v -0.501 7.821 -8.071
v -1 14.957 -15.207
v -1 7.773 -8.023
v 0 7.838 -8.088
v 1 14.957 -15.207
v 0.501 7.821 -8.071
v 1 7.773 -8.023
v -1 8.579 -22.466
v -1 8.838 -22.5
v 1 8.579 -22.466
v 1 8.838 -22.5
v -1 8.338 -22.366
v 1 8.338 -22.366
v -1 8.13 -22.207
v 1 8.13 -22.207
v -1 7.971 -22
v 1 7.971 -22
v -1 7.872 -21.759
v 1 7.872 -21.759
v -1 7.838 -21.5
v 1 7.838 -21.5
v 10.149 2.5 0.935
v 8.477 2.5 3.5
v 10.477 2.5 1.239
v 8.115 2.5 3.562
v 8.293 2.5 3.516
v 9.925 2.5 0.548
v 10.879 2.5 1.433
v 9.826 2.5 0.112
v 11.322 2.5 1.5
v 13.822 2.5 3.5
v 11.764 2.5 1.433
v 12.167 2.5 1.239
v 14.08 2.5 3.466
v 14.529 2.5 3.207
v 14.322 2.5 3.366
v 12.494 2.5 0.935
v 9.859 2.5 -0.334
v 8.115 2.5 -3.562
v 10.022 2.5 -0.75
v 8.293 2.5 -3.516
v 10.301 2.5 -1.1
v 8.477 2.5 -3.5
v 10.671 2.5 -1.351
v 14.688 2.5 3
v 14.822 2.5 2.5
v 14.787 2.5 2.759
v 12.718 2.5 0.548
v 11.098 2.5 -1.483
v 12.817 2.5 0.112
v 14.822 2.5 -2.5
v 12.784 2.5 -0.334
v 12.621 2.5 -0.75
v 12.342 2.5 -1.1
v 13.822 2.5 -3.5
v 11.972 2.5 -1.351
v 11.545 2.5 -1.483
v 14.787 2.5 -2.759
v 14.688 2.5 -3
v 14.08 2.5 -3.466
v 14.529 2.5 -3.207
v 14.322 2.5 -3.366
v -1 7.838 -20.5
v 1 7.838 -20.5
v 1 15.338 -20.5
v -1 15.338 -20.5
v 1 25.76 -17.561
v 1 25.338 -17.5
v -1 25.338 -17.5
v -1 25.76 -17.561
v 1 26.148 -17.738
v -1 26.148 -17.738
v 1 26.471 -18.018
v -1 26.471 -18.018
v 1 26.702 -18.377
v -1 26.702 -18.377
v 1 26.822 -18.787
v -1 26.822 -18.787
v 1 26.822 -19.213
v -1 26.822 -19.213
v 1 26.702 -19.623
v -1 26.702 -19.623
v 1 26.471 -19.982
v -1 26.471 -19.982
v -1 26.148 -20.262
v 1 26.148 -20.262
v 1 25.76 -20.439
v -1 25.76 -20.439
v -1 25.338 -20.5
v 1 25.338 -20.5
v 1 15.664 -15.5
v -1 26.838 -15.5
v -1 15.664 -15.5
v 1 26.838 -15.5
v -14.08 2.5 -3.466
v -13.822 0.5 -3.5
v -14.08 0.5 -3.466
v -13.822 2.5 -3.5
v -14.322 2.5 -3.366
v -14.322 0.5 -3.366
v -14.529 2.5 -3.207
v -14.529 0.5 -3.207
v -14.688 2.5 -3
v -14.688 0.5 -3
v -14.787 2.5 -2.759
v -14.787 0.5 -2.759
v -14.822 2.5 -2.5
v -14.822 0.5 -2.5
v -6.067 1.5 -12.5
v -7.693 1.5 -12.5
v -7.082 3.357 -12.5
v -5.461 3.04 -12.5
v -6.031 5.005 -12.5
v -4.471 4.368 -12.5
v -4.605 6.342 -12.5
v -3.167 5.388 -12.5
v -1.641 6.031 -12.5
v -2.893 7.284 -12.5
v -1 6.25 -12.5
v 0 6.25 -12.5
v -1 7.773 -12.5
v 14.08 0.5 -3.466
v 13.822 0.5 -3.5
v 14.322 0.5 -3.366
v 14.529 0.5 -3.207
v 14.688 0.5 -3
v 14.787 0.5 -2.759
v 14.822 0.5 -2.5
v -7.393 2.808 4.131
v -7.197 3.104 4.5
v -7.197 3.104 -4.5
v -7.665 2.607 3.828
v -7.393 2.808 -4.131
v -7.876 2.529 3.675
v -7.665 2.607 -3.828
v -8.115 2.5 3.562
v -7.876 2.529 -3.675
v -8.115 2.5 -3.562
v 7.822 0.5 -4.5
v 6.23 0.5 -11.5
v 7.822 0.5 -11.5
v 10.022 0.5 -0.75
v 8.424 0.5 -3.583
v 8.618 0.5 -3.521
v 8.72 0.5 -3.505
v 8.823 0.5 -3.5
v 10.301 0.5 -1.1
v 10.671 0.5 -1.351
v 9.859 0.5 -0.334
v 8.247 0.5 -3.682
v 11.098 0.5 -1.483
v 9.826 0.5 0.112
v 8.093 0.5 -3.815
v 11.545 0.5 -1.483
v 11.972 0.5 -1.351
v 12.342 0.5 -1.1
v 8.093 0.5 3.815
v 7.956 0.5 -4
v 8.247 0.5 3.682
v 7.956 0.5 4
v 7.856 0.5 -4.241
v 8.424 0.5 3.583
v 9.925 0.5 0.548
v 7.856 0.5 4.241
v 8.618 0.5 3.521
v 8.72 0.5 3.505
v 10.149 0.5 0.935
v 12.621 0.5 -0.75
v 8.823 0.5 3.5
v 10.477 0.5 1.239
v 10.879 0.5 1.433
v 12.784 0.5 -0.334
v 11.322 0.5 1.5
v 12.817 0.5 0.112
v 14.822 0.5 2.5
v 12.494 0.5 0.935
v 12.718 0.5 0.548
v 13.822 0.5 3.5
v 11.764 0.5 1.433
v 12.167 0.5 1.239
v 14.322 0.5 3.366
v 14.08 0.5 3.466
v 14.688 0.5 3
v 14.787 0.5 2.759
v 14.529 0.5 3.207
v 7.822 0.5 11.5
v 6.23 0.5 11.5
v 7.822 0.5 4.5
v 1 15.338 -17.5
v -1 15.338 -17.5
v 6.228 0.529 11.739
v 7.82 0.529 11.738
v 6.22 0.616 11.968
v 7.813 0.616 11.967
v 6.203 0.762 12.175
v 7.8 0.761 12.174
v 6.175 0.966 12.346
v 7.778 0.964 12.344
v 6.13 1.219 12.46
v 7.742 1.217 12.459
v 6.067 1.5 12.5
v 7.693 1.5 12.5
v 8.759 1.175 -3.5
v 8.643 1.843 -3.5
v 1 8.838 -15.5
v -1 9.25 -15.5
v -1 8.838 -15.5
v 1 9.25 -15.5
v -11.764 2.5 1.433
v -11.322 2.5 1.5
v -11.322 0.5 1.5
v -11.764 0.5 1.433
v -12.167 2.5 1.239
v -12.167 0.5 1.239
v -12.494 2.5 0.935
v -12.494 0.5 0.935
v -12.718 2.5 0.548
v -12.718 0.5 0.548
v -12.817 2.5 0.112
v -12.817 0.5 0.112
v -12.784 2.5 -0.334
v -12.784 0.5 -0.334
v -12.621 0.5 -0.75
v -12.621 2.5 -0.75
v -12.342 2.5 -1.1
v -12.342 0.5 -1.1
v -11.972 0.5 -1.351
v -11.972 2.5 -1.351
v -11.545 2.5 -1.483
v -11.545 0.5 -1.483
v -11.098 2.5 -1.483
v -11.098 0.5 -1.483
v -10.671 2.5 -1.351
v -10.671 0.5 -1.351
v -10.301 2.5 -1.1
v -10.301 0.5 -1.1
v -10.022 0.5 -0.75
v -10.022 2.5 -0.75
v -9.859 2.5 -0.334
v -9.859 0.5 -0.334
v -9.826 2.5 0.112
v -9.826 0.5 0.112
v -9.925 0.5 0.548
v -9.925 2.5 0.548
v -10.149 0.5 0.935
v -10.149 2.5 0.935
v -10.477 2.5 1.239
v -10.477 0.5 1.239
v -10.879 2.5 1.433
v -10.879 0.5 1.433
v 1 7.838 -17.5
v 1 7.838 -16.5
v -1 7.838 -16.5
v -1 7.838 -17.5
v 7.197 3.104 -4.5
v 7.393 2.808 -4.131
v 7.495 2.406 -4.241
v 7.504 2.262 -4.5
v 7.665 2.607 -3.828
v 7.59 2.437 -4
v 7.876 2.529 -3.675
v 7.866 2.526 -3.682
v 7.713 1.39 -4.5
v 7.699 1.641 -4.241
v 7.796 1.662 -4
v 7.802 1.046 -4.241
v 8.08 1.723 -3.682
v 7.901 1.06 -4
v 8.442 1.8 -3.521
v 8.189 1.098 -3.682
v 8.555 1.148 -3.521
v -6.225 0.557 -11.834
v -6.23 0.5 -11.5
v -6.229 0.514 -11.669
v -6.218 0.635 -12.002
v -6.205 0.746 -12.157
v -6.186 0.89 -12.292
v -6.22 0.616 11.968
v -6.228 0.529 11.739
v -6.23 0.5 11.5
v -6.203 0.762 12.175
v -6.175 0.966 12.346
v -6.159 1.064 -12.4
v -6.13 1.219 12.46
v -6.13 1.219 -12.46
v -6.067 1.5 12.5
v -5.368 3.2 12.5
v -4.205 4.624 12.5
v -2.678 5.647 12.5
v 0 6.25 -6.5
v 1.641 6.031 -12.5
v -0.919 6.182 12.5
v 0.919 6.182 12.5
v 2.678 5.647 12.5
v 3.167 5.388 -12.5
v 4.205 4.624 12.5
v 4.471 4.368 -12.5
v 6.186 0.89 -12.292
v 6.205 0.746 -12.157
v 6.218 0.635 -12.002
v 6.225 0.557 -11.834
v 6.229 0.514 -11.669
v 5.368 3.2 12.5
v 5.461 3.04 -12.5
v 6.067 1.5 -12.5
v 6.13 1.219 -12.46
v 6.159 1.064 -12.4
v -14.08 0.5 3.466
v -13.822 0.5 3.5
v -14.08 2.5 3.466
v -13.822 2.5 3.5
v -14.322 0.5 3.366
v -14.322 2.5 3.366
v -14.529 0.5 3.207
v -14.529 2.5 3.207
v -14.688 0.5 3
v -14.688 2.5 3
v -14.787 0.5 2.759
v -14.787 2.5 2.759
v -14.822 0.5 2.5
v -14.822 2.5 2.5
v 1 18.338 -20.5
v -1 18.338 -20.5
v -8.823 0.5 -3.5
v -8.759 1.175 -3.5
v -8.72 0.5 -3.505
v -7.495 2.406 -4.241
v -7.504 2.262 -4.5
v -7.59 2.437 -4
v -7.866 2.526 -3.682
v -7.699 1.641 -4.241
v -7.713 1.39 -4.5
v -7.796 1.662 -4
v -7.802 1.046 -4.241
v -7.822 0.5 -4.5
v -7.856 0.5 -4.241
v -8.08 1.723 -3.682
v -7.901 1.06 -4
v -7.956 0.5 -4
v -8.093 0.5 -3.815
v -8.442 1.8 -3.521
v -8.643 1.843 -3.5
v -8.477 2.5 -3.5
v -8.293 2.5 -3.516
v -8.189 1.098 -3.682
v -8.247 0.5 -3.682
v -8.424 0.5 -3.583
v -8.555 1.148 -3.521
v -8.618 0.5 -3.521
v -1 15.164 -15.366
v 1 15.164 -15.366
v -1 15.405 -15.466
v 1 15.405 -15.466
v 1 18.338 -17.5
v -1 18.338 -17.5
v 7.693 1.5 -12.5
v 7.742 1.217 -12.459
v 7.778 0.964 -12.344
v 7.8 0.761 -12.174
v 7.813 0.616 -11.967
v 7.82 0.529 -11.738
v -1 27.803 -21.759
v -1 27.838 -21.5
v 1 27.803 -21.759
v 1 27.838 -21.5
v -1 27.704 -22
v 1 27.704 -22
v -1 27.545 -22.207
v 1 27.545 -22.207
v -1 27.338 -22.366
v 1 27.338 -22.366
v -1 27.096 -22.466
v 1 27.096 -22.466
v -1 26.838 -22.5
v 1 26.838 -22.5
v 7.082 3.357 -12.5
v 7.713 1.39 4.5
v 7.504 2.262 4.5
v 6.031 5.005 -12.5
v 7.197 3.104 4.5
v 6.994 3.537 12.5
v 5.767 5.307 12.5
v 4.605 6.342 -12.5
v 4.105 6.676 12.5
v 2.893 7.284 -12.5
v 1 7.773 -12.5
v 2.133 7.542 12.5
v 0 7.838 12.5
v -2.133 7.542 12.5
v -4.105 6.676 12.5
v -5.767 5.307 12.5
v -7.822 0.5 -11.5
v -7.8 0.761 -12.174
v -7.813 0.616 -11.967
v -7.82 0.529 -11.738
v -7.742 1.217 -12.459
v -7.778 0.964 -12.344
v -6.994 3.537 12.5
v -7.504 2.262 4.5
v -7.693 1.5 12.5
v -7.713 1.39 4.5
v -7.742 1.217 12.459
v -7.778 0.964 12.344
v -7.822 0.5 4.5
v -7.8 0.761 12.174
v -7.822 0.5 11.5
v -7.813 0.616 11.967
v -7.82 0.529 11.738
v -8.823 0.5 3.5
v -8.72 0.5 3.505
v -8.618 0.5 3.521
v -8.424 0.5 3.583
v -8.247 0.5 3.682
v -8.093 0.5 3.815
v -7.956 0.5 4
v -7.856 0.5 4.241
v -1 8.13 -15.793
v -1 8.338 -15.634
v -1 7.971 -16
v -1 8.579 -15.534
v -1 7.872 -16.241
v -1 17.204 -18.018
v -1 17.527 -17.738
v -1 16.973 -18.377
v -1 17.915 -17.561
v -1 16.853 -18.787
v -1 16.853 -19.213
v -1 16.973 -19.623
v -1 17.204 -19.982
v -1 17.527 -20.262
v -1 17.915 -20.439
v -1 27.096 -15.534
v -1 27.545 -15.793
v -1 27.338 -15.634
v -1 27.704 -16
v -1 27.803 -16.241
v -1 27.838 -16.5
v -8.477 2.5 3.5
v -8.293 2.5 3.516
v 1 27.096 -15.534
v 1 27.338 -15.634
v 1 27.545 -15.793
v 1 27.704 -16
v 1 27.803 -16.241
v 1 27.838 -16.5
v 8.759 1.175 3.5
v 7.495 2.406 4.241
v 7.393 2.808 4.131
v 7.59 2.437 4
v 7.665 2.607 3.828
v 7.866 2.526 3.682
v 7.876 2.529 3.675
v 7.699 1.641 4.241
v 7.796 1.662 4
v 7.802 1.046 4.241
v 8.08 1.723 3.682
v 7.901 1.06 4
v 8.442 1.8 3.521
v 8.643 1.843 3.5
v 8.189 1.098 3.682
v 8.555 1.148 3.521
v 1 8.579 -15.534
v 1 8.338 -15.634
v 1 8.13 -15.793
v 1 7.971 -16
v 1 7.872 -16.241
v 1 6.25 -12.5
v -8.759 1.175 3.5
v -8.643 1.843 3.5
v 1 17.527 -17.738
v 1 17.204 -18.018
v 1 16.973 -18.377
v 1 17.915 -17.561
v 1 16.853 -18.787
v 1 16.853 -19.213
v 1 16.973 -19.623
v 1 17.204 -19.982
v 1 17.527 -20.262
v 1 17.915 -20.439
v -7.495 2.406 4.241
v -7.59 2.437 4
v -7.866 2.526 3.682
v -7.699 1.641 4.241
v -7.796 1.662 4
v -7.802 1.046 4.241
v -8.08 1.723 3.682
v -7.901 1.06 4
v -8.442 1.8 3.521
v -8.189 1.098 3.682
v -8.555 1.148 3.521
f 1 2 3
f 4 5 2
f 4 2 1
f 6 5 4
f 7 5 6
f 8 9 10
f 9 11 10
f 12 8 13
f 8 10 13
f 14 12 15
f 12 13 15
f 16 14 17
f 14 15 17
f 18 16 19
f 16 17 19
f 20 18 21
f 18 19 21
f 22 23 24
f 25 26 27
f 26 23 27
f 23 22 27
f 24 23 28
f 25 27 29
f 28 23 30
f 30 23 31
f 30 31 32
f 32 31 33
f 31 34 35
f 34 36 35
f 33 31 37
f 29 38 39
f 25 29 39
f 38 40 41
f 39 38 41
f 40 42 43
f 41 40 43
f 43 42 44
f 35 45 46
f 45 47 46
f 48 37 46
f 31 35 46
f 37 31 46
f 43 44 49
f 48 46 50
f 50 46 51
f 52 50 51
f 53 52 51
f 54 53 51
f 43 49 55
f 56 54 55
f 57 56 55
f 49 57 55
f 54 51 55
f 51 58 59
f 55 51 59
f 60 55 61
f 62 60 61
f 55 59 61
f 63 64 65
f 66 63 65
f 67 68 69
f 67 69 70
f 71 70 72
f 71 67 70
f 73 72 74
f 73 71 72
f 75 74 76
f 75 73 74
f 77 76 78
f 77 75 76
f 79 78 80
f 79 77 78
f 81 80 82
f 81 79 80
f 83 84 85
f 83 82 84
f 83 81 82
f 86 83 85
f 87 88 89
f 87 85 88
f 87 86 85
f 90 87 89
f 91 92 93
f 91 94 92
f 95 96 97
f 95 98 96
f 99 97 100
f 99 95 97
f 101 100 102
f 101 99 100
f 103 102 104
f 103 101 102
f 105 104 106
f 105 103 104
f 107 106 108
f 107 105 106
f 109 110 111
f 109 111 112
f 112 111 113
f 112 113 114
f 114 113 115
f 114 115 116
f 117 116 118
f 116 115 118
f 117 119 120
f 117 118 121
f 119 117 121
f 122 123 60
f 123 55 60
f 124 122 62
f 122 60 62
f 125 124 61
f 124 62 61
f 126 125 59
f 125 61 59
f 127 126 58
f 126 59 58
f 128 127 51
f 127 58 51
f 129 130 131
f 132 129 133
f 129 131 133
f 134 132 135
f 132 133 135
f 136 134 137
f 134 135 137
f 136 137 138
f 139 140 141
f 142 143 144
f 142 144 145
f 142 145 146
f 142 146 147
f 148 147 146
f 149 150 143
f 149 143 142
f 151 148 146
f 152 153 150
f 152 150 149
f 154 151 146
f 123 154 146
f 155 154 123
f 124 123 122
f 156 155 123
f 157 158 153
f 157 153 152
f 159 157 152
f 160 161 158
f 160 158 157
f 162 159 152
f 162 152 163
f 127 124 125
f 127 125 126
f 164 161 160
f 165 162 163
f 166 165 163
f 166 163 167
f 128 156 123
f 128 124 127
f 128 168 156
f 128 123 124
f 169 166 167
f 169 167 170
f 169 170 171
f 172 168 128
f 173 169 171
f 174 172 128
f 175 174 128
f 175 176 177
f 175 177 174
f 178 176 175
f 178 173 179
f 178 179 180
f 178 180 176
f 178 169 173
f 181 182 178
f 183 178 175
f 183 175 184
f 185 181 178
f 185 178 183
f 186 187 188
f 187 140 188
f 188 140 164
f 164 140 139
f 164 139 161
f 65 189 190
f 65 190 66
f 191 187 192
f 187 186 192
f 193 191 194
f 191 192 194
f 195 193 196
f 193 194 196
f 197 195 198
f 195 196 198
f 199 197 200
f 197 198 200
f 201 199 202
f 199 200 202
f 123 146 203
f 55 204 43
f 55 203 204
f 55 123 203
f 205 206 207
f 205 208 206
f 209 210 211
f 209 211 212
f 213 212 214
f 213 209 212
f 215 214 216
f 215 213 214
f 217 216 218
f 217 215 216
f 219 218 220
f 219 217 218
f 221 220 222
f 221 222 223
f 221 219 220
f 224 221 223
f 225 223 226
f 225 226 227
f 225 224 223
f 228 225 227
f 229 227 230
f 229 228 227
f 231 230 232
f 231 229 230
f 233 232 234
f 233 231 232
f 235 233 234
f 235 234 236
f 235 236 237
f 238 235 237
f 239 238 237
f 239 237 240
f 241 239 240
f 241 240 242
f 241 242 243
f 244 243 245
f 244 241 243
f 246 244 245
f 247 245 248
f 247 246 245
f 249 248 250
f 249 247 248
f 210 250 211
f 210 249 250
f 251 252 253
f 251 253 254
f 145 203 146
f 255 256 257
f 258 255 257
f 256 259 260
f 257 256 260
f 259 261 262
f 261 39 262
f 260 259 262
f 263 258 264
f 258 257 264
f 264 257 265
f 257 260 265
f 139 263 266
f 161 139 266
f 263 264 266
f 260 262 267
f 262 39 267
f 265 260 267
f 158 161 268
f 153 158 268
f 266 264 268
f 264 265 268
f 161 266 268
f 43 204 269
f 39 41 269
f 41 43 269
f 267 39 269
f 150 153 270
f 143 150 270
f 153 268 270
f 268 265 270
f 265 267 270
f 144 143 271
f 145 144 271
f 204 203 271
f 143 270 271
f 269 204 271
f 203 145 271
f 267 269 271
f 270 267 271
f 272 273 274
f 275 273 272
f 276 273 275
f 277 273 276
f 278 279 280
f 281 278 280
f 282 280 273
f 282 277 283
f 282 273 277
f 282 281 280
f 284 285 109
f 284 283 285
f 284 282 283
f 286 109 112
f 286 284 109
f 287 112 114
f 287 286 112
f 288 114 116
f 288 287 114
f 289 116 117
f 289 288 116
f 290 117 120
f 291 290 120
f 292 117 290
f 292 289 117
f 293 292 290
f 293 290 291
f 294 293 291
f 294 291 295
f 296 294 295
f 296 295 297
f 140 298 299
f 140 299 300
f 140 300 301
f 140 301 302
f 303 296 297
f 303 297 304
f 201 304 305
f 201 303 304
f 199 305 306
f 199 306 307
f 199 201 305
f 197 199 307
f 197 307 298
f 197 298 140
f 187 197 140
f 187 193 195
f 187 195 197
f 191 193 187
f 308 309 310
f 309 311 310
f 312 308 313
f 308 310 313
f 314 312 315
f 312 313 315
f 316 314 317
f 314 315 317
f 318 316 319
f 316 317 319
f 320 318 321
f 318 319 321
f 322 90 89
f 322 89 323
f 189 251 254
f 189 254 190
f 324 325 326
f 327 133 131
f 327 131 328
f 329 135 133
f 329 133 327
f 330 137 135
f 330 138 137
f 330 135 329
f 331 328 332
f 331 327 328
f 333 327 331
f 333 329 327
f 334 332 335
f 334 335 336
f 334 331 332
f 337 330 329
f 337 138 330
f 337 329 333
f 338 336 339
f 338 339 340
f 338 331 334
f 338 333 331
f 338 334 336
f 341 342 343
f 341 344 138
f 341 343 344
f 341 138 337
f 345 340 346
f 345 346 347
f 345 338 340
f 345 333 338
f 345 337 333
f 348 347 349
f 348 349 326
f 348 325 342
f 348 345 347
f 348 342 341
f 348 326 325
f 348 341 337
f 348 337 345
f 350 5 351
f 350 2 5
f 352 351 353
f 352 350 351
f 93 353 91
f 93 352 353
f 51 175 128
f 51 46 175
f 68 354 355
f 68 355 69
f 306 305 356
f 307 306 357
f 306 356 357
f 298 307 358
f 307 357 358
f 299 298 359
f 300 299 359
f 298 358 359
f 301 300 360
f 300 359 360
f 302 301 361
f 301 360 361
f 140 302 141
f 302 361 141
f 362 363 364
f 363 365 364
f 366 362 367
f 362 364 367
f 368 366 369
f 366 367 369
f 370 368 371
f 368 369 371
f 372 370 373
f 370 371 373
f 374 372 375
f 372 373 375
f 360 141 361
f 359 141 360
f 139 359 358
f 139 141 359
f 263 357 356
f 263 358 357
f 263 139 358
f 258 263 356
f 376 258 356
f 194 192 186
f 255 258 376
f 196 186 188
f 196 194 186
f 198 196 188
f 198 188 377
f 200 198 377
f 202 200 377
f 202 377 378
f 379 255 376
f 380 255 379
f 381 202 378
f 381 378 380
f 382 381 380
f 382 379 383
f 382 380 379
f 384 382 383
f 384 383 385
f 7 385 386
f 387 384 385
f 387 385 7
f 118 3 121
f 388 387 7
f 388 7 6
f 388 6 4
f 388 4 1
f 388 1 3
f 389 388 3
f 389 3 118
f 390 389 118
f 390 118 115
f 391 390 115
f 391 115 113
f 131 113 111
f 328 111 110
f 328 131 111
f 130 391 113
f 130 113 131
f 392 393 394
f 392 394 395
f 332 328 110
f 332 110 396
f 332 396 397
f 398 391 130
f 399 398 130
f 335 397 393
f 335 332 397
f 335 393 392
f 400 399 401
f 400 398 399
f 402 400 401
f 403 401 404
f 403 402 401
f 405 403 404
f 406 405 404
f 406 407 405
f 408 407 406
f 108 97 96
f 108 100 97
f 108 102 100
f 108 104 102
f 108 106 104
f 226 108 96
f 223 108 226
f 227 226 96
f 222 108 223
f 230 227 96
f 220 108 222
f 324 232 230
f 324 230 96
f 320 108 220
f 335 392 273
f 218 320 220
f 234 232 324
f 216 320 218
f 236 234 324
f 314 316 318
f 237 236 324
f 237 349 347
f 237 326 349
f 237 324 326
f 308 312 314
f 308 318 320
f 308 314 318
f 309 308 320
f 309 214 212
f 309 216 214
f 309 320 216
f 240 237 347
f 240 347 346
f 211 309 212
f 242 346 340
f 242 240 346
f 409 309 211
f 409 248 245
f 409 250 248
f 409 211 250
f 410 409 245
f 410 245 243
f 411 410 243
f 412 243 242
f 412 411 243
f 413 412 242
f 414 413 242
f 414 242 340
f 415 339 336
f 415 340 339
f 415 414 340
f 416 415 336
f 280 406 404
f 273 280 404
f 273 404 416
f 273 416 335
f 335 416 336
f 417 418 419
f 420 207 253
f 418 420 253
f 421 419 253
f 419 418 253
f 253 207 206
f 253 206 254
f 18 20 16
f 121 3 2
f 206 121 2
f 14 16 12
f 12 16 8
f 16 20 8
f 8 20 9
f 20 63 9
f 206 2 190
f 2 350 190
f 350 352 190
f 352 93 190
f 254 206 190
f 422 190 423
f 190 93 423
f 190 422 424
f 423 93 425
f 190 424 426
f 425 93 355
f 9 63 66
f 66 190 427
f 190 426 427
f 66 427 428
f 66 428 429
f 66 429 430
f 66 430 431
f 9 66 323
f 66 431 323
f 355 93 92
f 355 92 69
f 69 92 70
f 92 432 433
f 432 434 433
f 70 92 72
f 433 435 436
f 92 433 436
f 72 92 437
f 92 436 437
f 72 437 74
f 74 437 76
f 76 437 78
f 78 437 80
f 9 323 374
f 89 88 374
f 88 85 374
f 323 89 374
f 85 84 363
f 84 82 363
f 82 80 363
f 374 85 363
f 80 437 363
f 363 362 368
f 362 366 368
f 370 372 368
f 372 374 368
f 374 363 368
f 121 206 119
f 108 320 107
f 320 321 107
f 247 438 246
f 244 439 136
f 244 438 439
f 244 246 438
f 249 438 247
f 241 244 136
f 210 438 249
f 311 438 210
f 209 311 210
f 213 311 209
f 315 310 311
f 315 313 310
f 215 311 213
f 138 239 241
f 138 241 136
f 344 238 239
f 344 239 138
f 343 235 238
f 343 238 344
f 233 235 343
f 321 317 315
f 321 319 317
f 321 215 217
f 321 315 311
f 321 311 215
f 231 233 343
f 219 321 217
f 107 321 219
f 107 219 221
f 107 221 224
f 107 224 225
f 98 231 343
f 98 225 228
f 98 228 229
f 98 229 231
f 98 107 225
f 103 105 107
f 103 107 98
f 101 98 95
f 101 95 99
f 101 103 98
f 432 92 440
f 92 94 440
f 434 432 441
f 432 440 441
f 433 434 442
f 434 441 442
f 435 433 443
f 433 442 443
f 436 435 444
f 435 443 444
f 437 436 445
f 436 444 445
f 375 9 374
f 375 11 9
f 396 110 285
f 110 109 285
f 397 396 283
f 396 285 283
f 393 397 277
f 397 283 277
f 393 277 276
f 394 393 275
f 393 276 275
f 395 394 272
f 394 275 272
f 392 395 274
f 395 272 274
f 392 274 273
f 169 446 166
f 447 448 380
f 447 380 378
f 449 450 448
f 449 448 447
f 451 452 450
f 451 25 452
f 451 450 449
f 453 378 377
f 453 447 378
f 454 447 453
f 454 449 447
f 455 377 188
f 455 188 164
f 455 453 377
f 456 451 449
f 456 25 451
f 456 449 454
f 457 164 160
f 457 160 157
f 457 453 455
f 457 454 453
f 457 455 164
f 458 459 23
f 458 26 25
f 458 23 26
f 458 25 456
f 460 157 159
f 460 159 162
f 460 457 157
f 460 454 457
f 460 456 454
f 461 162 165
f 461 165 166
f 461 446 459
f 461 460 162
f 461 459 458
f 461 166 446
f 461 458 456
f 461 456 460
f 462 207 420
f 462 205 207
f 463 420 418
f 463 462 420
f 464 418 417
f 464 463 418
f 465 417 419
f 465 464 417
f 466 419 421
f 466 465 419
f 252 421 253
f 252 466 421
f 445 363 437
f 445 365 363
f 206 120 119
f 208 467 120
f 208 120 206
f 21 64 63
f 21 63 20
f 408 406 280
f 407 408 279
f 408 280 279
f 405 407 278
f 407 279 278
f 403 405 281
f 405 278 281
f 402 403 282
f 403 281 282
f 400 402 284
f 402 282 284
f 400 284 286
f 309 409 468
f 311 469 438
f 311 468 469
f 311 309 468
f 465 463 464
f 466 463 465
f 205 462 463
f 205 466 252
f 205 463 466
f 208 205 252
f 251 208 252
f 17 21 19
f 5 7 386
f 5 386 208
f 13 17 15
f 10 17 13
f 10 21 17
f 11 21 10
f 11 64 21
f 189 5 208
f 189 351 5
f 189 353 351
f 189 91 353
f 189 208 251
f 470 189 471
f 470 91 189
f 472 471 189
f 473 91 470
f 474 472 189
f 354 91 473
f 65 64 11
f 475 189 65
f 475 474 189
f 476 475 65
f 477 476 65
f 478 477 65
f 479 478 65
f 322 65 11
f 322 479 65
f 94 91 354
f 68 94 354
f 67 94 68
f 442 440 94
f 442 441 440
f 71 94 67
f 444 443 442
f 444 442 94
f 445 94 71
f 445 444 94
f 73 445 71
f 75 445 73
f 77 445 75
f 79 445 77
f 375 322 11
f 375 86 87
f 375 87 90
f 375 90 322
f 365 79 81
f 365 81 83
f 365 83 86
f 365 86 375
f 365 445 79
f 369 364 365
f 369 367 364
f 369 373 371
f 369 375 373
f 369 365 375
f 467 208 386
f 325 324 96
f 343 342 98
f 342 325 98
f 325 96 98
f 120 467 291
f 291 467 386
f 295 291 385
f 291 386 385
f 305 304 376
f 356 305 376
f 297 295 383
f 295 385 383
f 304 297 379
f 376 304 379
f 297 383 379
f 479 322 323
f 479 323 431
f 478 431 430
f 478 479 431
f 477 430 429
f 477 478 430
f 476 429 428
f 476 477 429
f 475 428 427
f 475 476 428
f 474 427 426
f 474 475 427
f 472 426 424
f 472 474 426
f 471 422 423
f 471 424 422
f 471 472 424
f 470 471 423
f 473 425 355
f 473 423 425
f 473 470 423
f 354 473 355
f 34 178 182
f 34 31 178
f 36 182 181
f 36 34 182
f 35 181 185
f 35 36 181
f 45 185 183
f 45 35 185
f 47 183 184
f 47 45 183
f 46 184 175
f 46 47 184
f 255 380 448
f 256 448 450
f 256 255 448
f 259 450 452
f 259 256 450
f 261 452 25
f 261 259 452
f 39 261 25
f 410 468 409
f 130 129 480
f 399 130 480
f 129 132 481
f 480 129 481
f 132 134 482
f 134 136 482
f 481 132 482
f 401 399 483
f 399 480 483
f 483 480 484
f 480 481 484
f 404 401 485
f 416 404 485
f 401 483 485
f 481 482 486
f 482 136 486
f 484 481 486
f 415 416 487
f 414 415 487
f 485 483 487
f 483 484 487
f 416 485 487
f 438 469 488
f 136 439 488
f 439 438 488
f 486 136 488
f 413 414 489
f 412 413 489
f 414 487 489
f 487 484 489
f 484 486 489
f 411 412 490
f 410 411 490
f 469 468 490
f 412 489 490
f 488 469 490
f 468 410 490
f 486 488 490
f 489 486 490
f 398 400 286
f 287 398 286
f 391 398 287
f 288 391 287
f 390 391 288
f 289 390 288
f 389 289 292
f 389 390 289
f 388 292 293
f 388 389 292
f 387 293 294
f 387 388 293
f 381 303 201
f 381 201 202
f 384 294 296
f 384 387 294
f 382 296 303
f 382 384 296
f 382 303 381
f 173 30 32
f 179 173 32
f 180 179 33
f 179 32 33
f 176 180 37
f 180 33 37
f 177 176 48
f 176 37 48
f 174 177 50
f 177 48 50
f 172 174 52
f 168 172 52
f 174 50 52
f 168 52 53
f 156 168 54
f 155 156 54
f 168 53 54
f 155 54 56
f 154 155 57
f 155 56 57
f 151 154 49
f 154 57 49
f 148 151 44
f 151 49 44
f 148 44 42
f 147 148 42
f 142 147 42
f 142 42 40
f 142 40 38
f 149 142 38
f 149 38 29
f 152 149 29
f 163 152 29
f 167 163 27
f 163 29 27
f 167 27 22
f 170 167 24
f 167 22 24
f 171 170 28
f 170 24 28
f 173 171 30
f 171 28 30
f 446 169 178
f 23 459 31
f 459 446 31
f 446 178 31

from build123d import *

# Parameters (mm, degrees)
BOSS_EXTRUDE1_DEPTH      = 12.5
BOSS_EXTRUDE3_REACH      = 29.026
BOSS_EXTRUDE3_END_RADIUS = 7.8375
SKETCH5_W                = 7
SKETCH5_H                = 2
SKETCH6_R                = 1.5
CUT_EXTRUDE2_DEPTH       = 2
FILLET2_R                = 1
FILLET2_OF_MIRROR2_R     = 1
BOSS_EXTRUDE4_DEPTH      = 1
SKETCH11_W               = 3
SKETCH11_H               = 7.5
CUT_EXTRUDE4_DEPTH       = 40.134350283
FILLET3_R                = 1


with BuildPart() as part:
    # Sketch1 → Boss-Extrude1 (new, symmetric)
    with BuildSketch(Plane.XY):
        with BuildLine():
            Line((-7.821534776, 0.5), (-6.229967897, 0.5))
            ThreePointArc((-6.229967897, 0.5), (0, 6.25), (6.229967897, 0.5))
            Line((6.229967897, 0.5), (7.821534776, 0.5))
            ThreePointArc((7.821534776, 0.5), (0, 7.8375), (-7.821534776, 0.5))
        make_face()
    extrude(amount=BOSS_EXTRUDE1_DEPTH, both=True)

    # Boss-Extrude3: up to this cylinder (the profile starts outside it)
    boss_extrude3_end = Plane(origin=(0, 0, 0), z_dir=(0, 0, -1)) * Cylinder(BOSS_EXTRUDE3_END_RADIUS, 74.727, mode=Mode.PRIVATE)
    # Sketch5 → Boss-Extrude3 (add, up to the surface)
    with BuildSketch(Plane(origin=(14.821534776, 0, 0), x_dir=(0, 0, -1), z_dir=(1, 0, 0)), mode=Mode.PRIVATE) as boss_extrude3_sk1:
        with Locations((0, 1.5)):
            Rectangle(SKETCH5_W, SKETCH5_H)
    boss_extrude3_tool1 = extrude(boss_extrude3_sk1.sketch, amount=-BOSS_EXTRUDE3_REACH, mode=Mode.PRIVATE) - boss_extrude3_end
    boss_extrude3 = boss_extrude3_tool1.solids().sort_by_distance((14.821535, 1.5, 0))[0]
    add(boss_extrude3)

    # Sketch6 → Cut-Extrude2 (cut)
    with BuildSketch(Plane(origin=(0, 2.5, 0), x_dir=(1, 0, 0), z_dir=(0, 1, 0))):
        with Locations(Location((11.321534776, 0, 0), (0, 0, 270))):
            Circle(SKETCH6_R)
    cut_extrude2 = extrude(amount=-CUT_EXTRUDE2_DEPTH, mode=Mode.SUBTRACT)

    # Fillet2
    fillet2_edges = [part.edges().sort_by_distance(p)[0] for p in [
        (14.821534776, 1.5, 3.5),
        (14.821534776, 1.5, -3.5),
        (7.690104358, 1.512845405, -3.5),
        (7.428082273, 2.5, 0),
        (7.690104358, 1.512845405, 3.5),
    ]]
    fillet(fillet2_edges, radius=FILLET2_R)

    # Mirror2: Boss-Extrude3, Cut-Extrude2 across plane
    add(boss_extrude3.mirror(Plane(origin=(0, 0, 0), x_dir=(0, 0, 1), z_dir=(1, 0, 0))))
    add(cut_extrude2.mirror(Plane(origin=(0, 0, 0), x_dir=(0, 0, 1), z_dir=(1, 0, 0))), mode=Mode.SUBTRACT)

    # Fillet2 of Mirror2
    fillet2_of_mirror2_edges = [part.edges().sort_by_distance(p)[0] for p in [
        (-14.821534776, 1.5, 3.5),
        (-14.821534776, 1.5, -3.5),
        (-7.690104358, 1.512845405, -3.5),
        (-7.428082273, 2.5, 0),
        (-7.690104358, 1.512845405, 3.5),
    ]]
    fillet(fillet2_of_mirror2_edges, radius=FILLET2_OF_MIRROR2_R)

    # Sketch8 → Boss-Extrude4 (add, symmetric)
    with BuildSketch(Plane(origin=(0, 0, 0), x_dir=(0, 0, -1), z_dir=(1, 0, 0))):
        Polygon((12.5, 6.25), (15.5, 9.25), (15.5, 7.8375), (22.5, 7.8375), (22.5, 27.8375), (15.5, 27.8375), (15.5, 15.25), (6.5, 6.25), align=None)
    extrude(amount=BOSS_EXTRUDE4_DEPTH, both=True)

    # Sketch11 → Cut-Extrude4 (cut, through all)
    with BuildSketch(Plane(origin=(1, 0, 0), x_dir=(0, 0, -1), z_dir=(1, 0, 0))):
        with BuildLine():
            Line((20.5, 25.3375), (20.5, 18.3375))
            ThreePointArc((20.5, 18.3375), (19, 16.8375), (17.5, 18.3375))
            Line((17.5, 18.3375), (17.5, 25.3375))
            ThreePointArc((17.5, 25.3375), (19, 26.8375), (20.5, 25.3375))
        make_face()
        with Locations((19, 11.5875)):
            Rectangle(SKETCH11_W, SKETCH11_H)
    extrude(amount=-CUT_EXTRUDE4_DEPTH, mode=Mode.SUBTRACT)

    # Fillet3
    fillet3_edges = [part.edges().sort_by_distance(p)[0] for p in [
        (0, 15.25, -15.5),
        (0, 7.8375, -15.5),
        (0, 7.8375, -22.5),
        (0, 27.8375, -22.5),
        (0, 27.8375, -15.5),
        (-7.025751337, 0.5, 12.5),
        (-7.025751337, 0.5, -12.5),
        (7.025751337, 0.5, -12.5),
        (7.025751337, 0.5, 12.5),
    ]]
    fillet(fillet3_edges, radius=FILLET3_R)


solid = part.part
